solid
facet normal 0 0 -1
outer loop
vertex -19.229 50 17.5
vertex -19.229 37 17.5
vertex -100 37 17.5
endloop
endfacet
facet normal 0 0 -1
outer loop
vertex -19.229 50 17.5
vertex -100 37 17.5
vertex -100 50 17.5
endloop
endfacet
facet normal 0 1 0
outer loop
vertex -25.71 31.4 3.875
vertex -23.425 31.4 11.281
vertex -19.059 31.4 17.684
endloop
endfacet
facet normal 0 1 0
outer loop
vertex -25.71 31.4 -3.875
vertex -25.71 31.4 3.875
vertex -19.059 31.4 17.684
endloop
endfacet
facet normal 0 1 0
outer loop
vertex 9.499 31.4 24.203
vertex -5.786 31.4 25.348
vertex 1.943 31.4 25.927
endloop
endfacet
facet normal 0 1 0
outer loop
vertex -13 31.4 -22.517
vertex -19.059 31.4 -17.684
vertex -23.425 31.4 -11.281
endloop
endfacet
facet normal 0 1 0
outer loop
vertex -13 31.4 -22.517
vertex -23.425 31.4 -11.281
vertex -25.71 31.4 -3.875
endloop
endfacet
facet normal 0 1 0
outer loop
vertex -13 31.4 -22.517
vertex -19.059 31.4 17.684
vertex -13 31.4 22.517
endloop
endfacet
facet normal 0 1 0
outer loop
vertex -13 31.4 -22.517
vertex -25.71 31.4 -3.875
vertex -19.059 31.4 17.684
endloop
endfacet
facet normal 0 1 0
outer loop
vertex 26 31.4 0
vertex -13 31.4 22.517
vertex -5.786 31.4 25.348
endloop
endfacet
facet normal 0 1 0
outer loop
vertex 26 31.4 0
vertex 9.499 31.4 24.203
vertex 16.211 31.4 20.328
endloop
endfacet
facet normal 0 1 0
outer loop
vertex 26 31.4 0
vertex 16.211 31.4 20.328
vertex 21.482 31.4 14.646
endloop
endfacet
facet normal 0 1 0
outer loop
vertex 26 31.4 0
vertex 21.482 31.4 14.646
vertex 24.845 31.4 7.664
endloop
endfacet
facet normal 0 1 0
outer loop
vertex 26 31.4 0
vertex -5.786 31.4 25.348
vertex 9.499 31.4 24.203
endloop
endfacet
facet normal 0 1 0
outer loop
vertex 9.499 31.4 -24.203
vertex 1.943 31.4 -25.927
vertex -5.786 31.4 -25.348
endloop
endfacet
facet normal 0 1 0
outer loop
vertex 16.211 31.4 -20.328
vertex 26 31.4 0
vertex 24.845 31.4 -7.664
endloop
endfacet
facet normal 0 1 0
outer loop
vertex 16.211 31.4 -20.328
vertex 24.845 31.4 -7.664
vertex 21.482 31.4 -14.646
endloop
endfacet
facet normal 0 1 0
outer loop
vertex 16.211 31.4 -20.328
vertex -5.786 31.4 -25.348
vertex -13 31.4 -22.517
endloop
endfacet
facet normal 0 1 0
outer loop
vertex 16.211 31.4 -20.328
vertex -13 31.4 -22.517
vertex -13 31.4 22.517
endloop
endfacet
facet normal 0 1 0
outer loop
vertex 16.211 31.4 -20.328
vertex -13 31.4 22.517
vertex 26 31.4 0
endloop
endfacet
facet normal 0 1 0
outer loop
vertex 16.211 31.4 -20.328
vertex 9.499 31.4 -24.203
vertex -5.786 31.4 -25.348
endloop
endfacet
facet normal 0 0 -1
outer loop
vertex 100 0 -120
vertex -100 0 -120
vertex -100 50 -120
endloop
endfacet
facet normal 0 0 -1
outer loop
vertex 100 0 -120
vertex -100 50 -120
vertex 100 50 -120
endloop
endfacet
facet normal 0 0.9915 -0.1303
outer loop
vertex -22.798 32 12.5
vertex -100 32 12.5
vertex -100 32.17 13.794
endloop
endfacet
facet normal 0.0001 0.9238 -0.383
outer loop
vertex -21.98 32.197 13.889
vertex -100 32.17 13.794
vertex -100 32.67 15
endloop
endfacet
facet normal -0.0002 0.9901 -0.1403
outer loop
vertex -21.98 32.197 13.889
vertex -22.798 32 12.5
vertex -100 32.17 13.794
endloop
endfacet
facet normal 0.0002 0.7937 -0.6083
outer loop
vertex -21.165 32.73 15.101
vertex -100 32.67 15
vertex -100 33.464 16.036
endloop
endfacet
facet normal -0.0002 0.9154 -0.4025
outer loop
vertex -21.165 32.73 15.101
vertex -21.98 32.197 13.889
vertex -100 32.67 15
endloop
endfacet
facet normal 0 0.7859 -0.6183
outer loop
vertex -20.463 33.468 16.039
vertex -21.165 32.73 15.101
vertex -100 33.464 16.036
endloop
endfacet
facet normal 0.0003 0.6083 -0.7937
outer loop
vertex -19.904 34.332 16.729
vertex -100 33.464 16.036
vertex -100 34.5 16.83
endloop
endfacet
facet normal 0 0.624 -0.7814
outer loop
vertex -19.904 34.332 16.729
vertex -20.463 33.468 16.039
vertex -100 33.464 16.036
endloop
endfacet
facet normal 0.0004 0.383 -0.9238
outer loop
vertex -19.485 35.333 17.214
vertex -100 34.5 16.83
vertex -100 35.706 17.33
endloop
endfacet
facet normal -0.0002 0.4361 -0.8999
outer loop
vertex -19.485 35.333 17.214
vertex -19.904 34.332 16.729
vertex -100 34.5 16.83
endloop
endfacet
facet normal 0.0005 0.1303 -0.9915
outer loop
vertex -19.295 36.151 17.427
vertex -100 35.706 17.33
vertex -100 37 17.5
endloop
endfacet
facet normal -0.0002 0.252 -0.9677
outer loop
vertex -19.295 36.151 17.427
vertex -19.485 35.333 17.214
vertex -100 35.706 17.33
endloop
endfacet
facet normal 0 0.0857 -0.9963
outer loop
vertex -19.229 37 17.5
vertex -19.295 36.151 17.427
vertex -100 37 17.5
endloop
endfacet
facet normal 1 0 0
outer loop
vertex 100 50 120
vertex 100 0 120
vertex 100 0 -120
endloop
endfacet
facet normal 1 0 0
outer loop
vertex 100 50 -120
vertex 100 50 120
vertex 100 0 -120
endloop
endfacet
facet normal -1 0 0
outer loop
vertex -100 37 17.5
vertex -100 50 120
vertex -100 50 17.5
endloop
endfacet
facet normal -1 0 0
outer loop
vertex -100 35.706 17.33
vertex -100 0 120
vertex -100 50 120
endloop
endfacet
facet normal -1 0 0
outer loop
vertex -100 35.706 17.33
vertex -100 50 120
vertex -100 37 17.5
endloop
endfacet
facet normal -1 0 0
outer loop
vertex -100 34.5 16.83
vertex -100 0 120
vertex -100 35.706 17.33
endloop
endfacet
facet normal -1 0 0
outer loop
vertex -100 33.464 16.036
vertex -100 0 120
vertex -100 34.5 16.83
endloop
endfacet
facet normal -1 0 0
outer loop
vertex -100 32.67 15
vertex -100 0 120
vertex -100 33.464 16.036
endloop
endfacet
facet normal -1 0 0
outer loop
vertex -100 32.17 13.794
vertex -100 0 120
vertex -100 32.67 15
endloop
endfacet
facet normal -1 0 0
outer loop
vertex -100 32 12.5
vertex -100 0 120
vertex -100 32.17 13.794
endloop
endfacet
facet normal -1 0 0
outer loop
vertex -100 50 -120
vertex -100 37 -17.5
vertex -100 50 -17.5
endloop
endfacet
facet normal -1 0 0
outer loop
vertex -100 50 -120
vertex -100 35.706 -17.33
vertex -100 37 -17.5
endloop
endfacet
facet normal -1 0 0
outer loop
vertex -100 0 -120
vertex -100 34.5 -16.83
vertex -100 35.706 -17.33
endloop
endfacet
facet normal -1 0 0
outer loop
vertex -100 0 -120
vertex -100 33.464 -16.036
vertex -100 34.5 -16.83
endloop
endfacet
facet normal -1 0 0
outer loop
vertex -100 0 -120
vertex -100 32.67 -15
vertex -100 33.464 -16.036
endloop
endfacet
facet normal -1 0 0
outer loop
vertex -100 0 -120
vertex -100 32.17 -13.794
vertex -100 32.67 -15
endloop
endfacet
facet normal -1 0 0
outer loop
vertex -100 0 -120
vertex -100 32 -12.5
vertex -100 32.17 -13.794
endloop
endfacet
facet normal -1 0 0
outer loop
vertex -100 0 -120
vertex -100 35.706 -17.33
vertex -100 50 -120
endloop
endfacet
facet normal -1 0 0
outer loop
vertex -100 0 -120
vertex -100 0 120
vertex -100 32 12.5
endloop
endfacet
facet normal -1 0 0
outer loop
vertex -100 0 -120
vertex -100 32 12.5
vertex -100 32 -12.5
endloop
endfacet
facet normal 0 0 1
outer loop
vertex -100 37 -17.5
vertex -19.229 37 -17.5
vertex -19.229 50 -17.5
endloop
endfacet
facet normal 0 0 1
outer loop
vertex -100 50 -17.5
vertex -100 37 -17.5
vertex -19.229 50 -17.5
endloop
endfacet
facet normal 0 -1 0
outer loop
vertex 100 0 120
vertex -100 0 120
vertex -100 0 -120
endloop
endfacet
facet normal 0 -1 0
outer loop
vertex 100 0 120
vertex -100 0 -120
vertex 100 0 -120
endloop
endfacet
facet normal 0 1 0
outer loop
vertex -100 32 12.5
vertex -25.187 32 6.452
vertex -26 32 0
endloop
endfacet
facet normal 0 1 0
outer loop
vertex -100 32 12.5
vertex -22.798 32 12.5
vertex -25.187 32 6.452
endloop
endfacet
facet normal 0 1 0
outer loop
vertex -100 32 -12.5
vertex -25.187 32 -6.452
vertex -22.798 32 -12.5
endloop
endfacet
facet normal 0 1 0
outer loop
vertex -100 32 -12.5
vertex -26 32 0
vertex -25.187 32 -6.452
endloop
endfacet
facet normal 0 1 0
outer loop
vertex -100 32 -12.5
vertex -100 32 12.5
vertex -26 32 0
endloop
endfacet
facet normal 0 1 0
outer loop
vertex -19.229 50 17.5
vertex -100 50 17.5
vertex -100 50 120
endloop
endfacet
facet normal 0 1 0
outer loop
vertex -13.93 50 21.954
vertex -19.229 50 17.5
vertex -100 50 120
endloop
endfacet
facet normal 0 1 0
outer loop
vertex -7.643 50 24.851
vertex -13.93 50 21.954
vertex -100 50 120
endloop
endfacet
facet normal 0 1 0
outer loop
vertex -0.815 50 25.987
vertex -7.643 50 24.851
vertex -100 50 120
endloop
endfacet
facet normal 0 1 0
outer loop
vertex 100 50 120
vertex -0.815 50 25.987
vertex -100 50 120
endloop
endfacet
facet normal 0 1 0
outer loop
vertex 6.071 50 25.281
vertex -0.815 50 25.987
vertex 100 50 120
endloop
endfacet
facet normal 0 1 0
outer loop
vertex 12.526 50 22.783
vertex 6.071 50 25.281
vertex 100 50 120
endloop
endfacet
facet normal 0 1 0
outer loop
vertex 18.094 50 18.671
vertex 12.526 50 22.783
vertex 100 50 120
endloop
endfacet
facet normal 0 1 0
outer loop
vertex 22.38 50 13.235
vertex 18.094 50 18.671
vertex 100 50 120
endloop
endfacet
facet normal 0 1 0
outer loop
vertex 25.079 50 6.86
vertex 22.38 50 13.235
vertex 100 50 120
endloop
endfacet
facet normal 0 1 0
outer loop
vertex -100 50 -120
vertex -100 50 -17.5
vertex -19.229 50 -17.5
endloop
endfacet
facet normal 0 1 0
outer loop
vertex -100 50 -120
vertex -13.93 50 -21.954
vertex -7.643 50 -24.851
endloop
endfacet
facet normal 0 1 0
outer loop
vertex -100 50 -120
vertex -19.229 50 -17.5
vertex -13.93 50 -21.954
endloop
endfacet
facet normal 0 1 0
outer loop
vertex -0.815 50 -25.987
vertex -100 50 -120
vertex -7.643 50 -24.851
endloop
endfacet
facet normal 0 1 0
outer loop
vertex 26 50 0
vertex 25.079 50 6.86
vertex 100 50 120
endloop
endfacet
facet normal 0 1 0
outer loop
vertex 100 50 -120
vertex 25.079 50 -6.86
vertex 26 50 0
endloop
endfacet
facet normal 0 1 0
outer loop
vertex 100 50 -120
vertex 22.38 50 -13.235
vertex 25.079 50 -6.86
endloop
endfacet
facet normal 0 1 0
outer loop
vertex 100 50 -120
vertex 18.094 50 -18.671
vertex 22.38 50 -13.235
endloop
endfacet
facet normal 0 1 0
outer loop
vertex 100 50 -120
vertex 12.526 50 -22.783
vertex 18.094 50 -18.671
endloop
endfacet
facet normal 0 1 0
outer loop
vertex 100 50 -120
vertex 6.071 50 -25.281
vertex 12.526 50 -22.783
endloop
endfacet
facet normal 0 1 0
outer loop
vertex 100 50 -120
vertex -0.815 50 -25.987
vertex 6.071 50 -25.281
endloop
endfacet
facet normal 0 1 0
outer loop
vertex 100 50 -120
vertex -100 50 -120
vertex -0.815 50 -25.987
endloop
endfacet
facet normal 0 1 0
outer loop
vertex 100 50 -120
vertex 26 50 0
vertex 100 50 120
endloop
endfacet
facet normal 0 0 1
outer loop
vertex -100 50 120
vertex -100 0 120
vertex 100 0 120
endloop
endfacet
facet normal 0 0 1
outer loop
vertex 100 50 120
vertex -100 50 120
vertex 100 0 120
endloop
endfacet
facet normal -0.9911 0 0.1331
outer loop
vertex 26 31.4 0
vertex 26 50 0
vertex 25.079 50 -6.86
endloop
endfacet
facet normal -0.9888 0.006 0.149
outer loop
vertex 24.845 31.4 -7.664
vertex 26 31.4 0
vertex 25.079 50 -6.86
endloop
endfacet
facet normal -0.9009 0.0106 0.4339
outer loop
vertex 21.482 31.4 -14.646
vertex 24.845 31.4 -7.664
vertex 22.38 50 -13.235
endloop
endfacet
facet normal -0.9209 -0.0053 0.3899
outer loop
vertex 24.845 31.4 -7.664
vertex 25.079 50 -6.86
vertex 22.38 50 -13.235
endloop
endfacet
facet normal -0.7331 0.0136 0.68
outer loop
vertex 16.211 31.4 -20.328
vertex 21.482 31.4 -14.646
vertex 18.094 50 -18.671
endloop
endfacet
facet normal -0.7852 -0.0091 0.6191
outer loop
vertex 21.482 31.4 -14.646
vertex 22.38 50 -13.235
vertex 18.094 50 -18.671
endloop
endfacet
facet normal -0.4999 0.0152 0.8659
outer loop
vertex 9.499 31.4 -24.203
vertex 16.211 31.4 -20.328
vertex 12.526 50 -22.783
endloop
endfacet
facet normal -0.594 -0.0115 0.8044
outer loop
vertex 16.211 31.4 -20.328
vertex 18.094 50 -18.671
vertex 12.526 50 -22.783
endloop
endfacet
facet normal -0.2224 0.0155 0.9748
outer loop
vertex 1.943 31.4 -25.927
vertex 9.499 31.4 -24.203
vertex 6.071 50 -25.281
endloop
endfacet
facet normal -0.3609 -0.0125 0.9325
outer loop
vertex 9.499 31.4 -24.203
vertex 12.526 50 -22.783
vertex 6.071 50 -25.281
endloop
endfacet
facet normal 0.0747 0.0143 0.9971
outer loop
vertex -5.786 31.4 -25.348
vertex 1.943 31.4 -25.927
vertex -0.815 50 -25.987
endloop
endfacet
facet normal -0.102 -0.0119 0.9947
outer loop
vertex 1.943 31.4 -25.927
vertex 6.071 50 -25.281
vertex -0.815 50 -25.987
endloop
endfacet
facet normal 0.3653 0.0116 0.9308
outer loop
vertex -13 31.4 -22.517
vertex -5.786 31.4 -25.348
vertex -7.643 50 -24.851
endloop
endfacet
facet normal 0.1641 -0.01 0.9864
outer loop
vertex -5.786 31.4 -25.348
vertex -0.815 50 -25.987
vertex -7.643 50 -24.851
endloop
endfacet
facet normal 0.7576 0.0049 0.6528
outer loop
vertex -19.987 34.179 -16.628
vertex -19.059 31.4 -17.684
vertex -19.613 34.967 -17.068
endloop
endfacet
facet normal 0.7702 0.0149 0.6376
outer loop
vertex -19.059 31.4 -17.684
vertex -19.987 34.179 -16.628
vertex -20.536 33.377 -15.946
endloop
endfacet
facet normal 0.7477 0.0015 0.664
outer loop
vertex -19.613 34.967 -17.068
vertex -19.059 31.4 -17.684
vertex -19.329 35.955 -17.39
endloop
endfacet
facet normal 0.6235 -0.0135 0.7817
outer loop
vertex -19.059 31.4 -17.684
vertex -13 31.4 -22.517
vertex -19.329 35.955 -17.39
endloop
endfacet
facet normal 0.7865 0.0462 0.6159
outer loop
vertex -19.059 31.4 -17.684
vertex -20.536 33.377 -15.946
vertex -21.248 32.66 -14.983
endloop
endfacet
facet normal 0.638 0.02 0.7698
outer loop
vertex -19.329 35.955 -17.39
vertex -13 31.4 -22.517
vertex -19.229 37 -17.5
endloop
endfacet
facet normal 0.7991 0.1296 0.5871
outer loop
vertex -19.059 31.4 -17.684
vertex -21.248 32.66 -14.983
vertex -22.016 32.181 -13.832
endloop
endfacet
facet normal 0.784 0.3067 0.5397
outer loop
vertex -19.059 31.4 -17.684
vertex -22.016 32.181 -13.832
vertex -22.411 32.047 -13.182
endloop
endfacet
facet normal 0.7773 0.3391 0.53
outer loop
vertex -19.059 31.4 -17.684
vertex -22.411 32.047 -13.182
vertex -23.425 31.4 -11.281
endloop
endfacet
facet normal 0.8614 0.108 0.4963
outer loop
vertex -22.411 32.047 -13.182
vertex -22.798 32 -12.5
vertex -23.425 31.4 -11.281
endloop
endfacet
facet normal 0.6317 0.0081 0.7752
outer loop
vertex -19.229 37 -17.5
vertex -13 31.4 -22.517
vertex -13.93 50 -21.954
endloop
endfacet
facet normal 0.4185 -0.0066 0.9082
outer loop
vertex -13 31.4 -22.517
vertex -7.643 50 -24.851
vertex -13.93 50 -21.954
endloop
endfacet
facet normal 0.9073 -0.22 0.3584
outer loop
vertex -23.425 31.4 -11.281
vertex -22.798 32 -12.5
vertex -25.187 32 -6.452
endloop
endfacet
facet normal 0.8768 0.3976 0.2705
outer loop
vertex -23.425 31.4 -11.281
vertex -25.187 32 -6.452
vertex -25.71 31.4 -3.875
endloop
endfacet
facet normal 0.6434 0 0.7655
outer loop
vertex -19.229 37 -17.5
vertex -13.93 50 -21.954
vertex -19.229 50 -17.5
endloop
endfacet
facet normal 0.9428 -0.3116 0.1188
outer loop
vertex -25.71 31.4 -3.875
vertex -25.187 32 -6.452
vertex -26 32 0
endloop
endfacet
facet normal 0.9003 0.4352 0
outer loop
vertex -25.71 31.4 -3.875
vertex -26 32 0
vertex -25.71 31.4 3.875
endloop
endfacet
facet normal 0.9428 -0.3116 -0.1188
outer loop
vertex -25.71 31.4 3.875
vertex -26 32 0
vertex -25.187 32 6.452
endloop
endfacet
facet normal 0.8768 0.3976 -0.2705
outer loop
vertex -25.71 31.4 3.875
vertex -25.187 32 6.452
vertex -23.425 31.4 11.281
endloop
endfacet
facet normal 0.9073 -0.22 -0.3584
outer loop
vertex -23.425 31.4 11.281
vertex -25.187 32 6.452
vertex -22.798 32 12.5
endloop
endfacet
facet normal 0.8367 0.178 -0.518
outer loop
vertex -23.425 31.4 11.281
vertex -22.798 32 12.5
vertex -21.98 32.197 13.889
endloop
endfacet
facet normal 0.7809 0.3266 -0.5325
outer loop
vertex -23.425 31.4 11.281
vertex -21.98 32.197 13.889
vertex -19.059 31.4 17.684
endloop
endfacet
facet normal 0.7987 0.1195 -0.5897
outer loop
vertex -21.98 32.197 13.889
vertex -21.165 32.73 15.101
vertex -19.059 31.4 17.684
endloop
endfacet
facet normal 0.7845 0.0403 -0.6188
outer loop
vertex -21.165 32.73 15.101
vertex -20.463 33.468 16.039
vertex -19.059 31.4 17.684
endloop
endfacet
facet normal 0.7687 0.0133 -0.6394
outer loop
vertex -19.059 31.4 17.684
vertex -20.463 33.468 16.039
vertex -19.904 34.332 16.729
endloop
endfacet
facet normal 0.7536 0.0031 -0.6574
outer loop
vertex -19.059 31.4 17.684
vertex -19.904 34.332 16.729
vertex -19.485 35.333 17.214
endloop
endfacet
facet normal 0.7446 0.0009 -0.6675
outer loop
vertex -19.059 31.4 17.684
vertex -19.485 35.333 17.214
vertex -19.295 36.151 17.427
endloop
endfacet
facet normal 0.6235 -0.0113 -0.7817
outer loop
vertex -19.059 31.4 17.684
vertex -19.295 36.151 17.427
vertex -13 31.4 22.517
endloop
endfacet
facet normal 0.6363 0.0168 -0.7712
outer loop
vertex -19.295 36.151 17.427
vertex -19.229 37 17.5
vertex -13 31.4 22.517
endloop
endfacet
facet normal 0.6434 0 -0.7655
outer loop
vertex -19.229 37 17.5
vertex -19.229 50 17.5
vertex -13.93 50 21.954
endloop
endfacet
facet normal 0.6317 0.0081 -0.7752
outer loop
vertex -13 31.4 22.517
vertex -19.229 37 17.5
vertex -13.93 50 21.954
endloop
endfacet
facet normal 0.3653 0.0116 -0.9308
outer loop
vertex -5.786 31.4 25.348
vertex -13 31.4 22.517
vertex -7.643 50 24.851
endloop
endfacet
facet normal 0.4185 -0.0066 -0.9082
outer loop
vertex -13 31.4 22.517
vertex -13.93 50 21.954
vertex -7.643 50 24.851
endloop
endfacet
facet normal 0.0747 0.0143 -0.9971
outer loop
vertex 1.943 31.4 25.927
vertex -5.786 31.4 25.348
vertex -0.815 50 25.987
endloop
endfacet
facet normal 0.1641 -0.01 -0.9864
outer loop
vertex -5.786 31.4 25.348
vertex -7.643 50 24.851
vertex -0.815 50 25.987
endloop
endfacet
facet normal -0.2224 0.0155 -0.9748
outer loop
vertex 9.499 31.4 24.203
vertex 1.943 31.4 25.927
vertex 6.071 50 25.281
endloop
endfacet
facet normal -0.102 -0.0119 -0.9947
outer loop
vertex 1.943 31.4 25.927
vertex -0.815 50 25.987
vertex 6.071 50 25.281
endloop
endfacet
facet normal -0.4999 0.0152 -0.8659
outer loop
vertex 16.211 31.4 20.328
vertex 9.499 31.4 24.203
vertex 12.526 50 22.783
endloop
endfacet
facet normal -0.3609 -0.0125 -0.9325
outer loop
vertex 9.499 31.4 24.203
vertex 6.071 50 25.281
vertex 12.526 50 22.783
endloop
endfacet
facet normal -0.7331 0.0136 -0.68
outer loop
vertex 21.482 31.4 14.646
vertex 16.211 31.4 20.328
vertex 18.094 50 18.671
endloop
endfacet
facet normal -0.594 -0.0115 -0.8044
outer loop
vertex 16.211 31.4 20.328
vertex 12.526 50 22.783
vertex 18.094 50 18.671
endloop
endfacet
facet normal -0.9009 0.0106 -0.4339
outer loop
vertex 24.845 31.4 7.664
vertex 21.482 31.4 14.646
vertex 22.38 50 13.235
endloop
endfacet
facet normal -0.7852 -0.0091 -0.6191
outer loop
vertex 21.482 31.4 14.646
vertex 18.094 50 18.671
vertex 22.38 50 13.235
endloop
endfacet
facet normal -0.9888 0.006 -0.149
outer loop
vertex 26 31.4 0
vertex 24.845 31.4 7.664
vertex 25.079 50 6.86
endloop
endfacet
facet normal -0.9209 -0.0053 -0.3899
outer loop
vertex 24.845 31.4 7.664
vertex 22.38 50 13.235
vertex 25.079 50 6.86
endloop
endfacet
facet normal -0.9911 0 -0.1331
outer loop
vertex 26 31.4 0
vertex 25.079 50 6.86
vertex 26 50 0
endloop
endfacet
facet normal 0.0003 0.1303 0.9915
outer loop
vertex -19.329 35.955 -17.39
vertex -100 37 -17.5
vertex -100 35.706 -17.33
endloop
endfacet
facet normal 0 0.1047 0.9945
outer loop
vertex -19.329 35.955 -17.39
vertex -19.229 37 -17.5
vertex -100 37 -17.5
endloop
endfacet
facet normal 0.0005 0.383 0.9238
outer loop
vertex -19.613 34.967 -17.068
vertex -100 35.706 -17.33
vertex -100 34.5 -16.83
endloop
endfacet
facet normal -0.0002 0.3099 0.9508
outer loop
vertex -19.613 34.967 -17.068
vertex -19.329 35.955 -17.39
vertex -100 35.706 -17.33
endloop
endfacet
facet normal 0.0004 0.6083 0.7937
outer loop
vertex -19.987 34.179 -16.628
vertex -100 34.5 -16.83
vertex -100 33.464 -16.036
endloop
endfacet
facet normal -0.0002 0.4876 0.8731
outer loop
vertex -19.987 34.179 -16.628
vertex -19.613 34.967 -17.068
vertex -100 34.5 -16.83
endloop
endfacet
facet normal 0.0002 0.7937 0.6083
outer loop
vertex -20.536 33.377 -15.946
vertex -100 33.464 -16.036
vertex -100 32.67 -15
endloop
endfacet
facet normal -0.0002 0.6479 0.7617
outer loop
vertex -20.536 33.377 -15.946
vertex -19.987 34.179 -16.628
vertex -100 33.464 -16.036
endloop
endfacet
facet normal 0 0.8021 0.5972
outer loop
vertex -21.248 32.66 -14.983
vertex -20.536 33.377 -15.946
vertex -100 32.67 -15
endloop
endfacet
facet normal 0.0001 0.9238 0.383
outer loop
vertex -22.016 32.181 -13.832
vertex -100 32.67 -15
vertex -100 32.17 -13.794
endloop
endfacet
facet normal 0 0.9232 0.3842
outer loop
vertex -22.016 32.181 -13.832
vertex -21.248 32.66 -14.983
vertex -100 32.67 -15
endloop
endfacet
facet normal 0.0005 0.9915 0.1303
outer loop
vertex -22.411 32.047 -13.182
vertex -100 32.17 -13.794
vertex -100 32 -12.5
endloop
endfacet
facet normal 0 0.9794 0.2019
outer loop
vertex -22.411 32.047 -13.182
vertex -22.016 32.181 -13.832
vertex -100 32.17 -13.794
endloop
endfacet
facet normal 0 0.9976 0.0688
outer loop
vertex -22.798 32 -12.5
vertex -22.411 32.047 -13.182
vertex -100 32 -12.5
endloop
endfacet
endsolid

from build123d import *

# Parameters (mm, degrees)
SKETCH1_W           = 200
SKETCH1_H           = 240
BASE_DEPTH          = 50
SKETCH2_R           = 26
LOAD_CELL_CUT_DEPTH = 18.6
WIRE_CUT_REACH      = 202
SKETCH3_W           = 35
SKETCH3_H           = 18
WIRE_CUT_FILLET_R   = 5


with BuildPart() as part:
    # Sketch1 → base (new body)
    with BuildSketch(Plane(origin=(0, 0, 0), x_dir=(1, 0, 0), z_dir=(0, 1, 0))):
        Rectangle(SKETCH1_W, SKETCH1_H)
    extrude(amount=BASE_DEPTH)

    # Sketch2 → load cell cut (cut)
    with BuildSketch(Plane(origin=(0, 50, 0), x_dir=(1, 0, 0), z_dir=(0, 1, 0))):
        Circle(SKETCH2_R)
    extrude(amount=-LOAD_CELL_CUT_DEPTH, mode=Mode.SUBTRACT)

    # Sketch3 → wire cut (cut, up to next)
    with BuildSketch(Plane(origin=(-100, 0, 0), x_dir=(0, 0, -1), z_dir=(1, 0, 0)), mode=Mode.PRIVATE) as wire_cut_sk1:
        with Locations((0, 41)):
            Rectangle(SKETCH3_W, SKETCH3_H)
    wire_cut_tool1 = extrude(wire_cut_sk1.sketch, amount=WIRE_CUT_REACH, mode=Mode.PRIVATE) & part.part
    add(wire_cut_tool1.solids().sort_by_distance((-100, 41, 0))[0], mode=Mode.SUBTRACT)

    # wire cut fillet
    wire_cut_fillet_edges = [part.edges().sort_by_distance(p)[0] for p in [
        (-59.614442262, 32, -17.5),
        (-59.614442262, 32, 17.5),
    ]]
    fillet(wire_cut_fillet_edges, radius=WIRE_CUT_FILLET_R)


solid = part.part
